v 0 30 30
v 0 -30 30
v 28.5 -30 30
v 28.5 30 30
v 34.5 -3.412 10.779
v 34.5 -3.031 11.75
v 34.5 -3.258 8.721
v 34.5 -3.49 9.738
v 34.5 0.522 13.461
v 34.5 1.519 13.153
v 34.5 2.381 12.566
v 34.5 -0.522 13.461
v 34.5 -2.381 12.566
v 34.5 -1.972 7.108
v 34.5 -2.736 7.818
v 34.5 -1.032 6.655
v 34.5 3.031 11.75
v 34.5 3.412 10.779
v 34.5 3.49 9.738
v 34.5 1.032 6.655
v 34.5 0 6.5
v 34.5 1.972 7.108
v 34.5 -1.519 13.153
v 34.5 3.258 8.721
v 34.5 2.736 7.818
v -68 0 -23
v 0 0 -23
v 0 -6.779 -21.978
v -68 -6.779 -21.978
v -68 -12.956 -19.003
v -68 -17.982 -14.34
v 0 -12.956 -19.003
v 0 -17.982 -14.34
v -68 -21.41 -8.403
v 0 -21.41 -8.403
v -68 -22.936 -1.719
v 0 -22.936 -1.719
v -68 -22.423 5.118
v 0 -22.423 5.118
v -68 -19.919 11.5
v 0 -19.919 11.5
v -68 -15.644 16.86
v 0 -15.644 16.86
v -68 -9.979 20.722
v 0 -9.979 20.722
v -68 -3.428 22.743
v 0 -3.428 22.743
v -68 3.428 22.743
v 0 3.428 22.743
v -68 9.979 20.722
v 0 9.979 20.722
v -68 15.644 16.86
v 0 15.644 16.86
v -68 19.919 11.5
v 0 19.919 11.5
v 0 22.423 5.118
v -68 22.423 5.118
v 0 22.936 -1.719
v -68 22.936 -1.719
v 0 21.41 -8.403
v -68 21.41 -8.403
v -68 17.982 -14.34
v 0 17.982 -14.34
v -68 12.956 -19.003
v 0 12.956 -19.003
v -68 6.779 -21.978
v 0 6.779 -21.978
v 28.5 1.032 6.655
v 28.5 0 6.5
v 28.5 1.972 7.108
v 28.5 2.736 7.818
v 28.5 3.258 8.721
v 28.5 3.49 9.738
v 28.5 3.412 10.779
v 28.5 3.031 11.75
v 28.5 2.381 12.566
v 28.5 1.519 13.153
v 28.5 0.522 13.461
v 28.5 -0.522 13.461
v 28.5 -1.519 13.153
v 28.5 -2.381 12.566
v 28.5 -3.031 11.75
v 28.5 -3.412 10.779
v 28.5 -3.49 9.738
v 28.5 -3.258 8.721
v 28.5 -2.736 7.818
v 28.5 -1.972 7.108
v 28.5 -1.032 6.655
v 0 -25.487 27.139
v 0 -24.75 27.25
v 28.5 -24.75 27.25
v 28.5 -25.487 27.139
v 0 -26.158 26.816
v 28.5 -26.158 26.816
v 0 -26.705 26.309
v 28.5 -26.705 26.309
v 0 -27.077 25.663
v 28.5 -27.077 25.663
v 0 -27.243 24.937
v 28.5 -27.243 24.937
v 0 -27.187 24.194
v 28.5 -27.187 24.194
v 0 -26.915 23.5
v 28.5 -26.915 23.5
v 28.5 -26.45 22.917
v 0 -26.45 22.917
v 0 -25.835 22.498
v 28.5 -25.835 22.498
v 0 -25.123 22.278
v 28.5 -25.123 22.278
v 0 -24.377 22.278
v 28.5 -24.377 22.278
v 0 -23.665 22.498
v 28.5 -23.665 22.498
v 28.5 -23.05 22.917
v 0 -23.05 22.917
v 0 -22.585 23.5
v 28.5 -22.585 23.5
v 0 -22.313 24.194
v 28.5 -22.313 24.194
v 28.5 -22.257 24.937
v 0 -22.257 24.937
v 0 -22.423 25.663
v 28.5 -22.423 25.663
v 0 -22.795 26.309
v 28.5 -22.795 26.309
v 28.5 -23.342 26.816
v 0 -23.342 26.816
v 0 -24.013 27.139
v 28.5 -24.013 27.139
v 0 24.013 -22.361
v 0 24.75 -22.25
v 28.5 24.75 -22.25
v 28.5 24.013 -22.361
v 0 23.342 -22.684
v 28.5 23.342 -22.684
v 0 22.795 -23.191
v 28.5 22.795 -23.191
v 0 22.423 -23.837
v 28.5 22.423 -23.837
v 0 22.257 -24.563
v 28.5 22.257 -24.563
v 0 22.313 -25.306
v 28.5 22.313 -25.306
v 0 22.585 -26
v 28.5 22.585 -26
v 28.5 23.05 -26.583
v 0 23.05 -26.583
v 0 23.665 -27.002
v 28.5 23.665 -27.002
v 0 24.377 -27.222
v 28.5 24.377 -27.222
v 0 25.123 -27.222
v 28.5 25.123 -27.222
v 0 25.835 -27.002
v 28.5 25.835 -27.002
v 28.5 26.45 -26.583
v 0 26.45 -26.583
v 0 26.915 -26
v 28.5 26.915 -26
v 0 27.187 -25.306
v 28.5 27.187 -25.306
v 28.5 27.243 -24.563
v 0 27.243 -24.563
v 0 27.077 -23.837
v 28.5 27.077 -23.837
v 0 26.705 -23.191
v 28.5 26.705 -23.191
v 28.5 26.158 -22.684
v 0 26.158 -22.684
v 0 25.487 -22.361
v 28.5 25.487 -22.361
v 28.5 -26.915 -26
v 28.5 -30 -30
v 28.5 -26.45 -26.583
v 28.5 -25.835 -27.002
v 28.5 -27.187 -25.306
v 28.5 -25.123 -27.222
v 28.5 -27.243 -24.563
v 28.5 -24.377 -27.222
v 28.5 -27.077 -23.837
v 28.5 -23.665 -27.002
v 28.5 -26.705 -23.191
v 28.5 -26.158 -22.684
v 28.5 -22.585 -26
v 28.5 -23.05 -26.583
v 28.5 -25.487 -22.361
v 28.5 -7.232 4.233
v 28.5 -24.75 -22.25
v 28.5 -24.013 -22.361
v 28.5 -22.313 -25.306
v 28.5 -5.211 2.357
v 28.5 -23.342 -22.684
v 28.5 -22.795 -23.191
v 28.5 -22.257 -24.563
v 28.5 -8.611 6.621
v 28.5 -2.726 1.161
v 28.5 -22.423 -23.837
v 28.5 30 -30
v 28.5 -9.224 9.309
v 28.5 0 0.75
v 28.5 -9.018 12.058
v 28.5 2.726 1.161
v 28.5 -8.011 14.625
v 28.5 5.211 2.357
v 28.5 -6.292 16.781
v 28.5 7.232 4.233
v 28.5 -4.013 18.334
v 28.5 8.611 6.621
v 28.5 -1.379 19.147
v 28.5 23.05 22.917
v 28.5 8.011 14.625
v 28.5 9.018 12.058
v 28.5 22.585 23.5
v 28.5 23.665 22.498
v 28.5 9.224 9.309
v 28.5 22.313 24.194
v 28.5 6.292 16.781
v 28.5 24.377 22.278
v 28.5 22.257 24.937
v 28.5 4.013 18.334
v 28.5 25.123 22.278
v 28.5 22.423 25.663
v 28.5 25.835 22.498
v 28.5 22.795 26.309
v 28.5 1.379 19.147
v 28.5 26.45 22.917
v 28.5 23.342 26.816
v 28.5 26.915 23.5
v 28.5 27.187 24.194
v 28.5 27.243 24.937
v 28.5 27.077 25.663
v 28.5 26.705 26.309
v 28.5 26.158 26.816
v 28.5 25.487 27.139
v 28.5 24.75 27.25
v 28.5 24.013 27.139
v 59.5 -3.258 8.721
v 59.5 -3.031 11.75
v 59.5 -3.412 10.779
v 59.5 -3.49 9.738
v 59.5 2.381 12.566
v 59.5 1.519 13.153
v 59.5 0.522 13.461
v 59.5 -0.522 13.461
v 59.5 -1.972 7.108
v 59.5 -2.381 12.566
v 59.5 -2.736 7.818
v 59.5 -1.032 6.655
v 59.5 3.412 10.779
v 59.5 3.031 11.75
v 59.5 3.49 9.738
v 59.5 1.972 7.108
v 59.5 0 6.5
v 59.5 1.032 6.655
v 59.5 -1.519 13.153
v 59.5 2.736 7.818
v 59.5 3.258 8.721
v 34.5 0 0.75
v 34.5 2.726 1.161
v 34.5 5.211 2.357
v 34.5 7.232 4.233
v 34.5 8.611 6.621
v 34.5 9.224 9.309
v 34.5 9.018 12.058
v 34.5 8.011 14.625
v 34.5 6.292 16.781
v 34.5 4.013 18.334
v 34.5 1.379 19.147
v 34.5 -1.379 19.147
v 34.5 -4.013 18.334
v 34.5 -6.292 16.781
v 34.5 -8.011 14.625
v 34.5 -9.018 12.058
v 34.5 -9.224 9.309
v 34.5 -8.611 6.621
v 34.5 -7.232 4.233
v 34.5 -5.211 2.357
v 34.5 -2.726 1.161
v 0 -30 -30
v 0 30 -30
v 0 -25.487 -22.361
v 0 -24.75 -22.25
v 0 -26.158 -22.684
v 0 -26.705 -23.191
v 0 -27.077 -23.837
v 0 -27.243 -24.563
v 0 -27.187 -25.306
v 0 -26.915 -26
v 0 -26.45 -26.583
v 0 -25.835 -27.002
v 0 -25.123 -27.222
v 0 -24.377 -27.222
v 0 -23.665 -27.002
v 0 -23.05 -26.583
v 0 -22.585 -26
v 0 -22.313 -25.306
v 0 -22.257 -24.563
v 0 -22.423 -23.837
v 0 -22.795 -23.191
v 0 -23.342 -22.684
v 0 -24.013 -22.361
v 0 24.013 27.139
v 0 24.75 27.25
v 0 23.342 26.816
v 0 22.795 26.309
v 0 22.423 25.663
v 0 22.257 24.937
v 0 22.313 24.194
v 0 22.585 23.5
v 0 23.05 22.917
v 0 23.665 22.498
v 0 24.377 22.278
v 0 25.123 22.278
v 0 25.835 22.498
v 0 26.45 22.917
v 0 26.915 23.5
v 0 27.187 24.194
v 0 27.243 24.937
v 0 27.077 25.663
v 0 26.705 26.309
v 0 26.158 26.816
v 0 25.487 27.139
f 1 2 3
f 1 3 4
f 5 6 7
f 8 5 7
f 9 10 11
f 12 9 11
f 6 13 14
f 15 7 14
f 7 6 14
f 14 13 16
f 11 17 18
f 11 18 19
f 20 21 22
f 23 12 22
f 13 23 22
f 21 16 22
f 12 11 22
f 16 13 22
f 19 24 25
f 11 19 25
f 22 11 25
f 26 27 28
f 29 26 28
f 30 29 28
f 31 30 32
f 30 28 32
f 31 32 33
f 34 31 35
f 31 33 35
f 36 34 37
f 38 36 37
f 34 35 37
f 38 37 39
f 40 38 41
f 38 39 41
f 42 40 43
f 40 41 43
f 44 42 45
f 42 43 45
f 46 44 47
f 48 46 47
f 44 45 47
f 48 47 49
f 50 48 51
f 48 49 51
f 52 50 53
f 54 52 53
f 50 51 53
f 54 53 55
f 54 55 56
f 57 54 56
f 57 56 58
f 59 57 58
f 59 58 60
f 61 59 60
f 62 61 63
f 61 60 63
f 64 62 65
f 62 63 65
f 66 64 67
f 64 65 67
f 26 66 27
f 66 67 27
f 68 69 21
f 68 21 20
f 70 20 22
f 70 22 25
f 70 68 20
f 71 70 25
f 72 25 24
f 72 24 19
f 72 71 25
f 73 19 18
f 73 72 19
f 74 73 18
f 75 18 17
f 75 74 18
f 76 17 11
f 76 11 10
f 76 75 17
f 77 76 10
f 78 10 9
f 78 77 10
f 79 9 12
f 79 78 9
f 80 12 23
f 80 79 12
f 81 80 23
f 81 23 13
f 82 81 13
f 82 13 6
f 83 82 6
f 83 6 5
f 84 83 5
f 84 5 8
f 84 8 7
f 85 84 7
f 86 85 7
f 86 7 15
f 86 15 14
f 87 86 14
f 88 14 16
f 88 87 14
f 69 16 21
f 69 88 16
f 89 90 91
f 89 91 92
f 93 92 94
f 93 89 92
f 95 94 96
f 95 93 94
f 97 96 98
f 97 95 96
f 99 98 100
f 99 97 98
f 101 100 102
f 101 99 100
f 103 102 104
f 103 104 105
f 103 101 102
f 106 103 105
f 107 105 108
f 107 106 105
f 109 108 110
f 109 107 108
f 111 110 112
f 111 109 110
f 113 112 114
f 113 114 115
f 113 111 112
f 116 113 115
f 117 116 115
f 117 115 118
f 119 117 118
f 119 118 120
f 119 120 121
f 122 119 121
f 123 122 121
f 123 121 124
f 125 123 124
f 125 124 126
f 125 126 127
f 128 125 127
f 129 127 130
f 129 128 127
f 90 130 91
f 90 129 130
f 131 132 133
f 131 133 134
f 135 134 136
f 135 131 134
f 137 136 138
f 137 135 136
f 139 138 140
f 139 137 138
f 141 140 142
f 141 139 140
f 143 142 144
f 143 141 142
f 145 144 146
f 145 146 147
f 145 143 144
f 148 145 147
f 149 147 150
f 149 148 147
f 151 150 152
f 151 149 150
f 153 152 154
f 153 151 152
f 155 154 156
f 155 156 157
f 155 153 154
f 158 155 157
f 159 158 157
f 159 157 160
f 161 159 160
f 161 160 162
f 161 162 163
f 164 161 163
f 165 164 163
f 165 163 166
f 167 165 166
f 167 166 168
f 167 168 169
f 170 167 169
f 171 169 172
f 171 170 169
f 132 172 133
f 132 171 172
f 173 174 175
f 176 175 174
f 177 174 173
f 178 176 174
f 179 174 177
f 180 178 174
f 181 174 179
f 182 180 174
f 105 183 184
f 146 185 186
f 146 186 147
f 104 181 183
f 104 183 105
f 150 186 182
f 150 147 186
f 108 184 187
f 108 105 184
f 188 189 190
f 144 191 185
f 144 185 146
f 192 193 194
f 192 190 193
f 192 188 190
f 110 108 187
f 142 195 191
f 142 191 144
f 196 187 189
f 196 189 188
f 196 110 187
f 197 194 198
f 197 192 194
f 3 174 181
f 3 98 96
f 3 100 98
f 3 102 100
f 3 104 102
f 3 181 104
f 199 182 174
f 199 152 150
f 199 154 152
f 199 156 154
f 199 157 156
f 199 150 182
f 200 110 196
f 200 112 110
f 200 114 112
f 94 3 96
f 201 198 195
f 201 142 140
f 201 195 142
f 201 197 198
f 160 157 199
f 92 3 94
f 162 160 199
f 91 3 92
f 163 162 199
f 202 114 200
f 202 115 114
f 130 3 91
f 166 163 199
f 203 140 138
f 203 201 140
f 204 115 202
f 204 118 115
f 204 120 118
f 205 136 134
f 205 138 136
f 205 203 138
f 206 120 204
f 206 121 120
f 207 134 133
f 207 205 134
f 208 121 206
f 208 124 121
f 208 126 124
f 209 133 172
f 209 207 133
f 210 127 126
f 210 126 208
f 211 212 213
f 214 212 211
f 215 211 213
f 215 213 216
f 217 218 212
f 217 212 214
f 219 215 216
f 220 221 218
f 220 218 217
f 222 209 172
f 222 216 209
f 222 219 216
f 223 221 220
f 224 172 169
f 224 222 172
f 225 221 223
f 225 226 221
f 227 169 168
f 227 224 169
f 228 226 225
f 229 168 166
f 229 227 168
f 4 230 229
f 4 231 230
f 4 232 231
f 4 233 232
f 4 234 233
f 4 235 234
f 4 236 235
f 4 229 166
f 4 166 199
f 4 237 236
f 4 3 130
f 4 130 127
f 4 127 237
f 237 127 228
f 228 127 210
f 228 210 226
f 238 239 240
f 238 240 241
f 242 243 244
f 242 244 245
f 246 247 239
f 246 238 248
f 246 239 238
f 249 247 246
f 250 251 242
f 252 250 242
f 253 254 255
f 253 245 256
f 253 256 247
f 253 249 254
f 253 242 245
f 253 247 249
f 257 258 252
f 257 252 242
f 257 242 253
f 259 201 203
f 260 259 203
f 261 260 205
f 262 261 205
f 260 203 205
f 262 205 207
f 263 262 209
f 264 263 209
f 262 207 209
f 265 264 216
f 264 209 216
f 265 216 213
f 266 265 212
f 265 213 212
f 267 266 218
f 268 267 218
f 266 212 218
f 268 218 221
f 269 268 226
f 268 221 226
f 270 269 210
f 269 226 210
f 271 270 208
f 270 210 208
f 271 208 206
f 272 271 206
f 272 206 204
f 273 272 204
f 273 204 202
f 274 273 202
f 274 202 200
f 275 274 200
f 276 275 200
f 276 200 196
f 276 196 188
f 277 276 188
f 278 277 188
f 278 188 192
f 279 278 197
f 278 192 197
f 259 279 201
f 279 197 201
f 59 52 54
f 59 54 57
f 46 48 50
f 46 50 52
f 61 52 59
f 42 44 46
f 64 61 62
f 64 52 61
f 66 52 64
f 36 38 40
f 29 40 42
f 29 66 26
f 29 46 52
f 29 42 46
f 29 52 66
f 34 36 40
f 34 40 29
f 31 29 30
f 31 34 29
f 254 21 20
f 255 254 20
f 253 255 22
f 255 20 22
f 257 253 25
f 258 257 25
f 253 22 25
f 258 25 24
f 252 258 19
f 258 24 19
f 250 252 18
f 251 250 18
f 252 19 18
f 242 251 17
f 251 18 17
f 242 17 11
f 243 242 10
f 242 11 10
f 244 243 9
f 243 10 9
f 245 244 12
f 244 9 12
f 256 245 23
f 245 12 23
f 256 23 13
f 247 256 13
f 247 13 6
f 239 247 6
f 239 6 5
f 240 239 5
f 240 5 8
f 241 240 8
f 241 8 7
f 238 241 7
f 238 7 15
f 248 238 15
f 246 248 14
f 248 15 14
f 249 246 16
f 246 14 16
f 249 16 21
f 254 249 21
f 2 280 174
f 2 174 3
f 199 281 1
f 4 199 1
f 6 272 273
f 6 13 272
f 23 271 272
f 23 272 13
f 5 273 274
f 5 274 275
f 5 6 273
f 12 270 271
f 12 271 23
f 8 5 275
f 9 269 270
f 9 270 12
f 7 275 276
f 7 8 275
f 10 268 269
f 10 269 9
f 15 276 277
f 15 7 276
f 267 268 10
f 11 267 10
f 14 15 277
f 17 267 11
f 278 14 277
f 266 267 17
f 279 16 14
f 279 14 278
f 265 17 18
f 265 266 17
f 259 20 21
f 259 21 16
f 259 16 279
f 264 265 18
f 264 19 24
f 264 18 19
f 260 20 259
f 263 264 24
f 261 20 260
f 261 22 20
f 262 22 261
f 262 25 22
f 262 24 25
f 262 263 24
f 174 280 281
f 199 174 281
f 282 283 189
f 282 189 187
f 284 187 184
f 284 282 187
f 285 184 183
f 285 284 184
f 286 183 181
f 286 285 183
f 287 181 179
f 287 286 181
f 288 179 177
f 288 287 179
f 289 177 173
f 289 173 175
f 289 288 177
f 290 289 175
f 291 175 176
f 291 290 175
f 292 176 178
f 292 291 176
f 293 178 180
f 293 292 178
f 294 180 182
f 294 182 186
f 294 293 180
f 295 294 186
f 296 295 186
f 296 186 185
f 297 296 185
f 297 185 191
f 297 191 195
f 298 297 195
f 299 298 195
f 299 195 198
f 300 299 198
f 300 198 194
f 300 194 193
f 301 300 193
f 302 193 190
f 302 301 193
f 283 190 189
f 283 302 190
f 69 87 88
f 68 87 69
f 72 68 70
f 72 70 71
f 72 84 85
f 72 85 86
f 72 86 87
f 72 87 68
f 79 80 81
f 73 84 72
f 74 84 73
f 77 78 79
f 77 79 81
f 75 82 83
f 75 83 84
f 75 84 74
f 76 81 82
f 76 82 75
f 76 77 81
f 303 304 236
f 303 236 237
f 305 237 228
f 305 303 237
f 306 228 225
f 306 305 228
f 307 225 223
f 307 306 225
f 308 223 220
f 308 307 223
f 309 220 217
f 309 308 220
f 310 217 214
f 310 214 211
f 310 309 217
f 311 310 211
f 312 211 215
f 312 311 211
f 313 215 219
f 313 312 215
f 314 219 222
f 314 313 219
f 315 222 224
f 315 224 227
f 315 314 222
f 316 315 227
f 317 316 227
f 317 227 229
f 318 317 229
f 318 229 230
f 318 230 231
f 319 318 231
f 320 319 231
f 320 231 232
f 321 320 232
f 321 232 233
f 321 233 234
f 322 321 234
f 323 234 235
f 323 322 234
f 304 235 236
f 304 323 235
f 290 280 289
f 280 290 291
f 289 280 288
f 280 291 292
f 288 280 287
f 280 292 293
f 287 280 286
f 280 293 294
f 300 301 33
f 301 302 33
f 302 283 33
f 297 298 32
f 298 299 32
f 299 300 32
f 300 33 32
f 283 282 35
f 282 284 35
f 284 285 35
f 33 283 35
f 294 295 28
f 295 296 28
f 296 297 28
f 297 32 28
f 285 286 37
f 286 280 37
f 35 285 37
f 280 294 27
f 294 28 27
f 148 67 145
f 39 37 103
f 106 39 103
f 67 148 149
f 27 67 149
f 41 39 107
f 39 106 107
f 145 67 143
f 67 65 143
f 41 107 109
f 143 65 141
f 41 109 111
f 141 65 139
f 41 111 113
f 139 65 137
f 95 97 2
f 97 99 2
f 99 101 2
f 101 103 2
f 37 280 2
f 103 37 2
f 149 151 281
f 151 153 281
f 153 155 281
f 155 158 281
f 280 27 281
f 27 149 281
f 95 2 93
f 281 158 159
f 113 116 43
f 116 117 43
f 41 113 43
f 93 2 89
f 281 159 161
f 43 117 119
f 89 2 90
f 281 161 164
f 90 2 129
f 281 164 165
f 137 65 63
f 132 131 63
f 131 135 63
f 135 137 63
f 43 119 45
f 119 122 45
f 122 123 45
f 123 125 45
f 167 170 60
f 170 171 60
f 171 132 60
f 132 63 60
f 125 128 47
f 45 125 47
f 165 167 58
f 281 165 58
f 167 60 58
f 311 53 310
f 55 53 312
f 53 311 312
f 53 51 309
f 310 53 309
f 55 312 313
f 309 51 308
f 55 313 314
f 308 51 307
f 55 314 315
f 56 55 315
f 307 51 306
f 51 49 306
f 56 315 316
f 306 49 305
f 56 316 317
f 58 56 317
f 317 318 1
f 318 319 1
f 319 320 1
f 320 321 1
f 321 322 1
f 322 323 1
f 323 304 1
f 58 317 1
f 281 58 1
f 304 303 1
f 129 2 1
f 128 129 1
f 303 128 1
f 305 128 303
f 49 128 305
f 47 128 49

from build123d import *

# Parameters (mm, degrees)
SKETCH1_W           = 60
SKETCH1_H           = 60
SKETCH1_R           = 2.5
SKETCH1_R_2         = 9.25
SKETCH1_R_3         = 3.5
BOSS_EXTRUDE1_DEPTH = 28.5
BOSS_EXTRUDE2_START = 28.5
SKETCH1_3_R         = 9.25
SKETCH1_3_R_2       = 3.5
BOSS_EXTRUDE2_DEPTH = 6
BOSS_EXTRUDE3_START = 34.5
SKETCH1_4_R         = 3.5
BOSS_EXTRUDE3_DEPTH = 25
SKETCH2_R           = 23
BOSS_EXTRUDE4_DEPTH = 68


with BuildPart() as part:
    # Sketch1 → Boss-Extrude1 (new body)
    # profile 1 of 3: a face of its own
    with BuildSketch(Plane.YZ):
        Rectangle(SKETCH1_W, SKETCH1_H)
        with Locations(Location((24.75, 24.75, 0), (0, 0, 90))):
            Circle(SKETCH1_R, mode=Mode.SUBTRACT)
        with Locations(Location((-24.75, 24.75, 0), (0, 0, 90))):
            Circle(SKETCH1_R, mode=Mode.SUBTRACT)
        with Locations(Location((24.75, -24.75, 0), (0, 0, 90))):
            Circle(SKETCH1_R, mode=Mode.SUBTRACT)
        with Locations(Location((-24.75, -24.75, 0), (0, 0, 90))):
            Circle(SKETCH1_R, mode=Mode.SUBTRACT)
    # profile 2 of 3: a face of its own
    with BuildSketch(Plane.YZ):
        with Locations((0, 10)):
            Circle(SKETCH1_R_2)
        with Locations((0, 10)):
            Circle(SKETCH1_R_3, mode=Mode.SUBTRACT)
    # profile 3 of 3: a face of its own
    with BuildSketch(Plane.YZ):
        with Locations((0, 10)):
            Circle(SKETCH1_R_3)
    extrude(amount=BOSS_EXTRUDE1_DEPTH)

    # Sketch1<3> → Boss-Extrude2 (add)
    with BuildSketch(Plane.YZ.offset(BOSS_EXTRUDE2_START)):
        with Locations(Location((0, 10, 0), (0, 0, 270))):
            Circle(SKETCH1_3_R)
        with Locations(Location((0, 10, 0), (0, 0, 270))):
            Circle(SKETCH1_3_R_2, mode=Mode.SUBTRACT)
    extrude(amount=BOSS_EXTRUDE2_DEPTH)

    # Sketch2 → Boss-Extrude4 (add)
    with BuildSketch(Plane(origin=(0, 0, 0), x_dir=(0, -1, 0), z_dir=(-1, 0, 0))):
        with Locations(Location((0, 0, 0), (0, 0, 270))):
            Circle(SKETCH2_R)
    extrude(amount=BOSS_EXTRUDE4_DEPTH)


with BuildPart() as body_2:
    # Sketch1<4> → Boss-Extrude3 (new body)
    with BuildSketch(Plane.YZ.offset(BOSS_EXTRUDE3_START)):
        with Locations(Location((0, 10, 0), (0, 0, 270))):
            Circle(SKETCH1_4_R)
    extrude(amount=BOSS_EXTRUDE3_DEPTH)


solid = Compound([part.part, body_2.part])
